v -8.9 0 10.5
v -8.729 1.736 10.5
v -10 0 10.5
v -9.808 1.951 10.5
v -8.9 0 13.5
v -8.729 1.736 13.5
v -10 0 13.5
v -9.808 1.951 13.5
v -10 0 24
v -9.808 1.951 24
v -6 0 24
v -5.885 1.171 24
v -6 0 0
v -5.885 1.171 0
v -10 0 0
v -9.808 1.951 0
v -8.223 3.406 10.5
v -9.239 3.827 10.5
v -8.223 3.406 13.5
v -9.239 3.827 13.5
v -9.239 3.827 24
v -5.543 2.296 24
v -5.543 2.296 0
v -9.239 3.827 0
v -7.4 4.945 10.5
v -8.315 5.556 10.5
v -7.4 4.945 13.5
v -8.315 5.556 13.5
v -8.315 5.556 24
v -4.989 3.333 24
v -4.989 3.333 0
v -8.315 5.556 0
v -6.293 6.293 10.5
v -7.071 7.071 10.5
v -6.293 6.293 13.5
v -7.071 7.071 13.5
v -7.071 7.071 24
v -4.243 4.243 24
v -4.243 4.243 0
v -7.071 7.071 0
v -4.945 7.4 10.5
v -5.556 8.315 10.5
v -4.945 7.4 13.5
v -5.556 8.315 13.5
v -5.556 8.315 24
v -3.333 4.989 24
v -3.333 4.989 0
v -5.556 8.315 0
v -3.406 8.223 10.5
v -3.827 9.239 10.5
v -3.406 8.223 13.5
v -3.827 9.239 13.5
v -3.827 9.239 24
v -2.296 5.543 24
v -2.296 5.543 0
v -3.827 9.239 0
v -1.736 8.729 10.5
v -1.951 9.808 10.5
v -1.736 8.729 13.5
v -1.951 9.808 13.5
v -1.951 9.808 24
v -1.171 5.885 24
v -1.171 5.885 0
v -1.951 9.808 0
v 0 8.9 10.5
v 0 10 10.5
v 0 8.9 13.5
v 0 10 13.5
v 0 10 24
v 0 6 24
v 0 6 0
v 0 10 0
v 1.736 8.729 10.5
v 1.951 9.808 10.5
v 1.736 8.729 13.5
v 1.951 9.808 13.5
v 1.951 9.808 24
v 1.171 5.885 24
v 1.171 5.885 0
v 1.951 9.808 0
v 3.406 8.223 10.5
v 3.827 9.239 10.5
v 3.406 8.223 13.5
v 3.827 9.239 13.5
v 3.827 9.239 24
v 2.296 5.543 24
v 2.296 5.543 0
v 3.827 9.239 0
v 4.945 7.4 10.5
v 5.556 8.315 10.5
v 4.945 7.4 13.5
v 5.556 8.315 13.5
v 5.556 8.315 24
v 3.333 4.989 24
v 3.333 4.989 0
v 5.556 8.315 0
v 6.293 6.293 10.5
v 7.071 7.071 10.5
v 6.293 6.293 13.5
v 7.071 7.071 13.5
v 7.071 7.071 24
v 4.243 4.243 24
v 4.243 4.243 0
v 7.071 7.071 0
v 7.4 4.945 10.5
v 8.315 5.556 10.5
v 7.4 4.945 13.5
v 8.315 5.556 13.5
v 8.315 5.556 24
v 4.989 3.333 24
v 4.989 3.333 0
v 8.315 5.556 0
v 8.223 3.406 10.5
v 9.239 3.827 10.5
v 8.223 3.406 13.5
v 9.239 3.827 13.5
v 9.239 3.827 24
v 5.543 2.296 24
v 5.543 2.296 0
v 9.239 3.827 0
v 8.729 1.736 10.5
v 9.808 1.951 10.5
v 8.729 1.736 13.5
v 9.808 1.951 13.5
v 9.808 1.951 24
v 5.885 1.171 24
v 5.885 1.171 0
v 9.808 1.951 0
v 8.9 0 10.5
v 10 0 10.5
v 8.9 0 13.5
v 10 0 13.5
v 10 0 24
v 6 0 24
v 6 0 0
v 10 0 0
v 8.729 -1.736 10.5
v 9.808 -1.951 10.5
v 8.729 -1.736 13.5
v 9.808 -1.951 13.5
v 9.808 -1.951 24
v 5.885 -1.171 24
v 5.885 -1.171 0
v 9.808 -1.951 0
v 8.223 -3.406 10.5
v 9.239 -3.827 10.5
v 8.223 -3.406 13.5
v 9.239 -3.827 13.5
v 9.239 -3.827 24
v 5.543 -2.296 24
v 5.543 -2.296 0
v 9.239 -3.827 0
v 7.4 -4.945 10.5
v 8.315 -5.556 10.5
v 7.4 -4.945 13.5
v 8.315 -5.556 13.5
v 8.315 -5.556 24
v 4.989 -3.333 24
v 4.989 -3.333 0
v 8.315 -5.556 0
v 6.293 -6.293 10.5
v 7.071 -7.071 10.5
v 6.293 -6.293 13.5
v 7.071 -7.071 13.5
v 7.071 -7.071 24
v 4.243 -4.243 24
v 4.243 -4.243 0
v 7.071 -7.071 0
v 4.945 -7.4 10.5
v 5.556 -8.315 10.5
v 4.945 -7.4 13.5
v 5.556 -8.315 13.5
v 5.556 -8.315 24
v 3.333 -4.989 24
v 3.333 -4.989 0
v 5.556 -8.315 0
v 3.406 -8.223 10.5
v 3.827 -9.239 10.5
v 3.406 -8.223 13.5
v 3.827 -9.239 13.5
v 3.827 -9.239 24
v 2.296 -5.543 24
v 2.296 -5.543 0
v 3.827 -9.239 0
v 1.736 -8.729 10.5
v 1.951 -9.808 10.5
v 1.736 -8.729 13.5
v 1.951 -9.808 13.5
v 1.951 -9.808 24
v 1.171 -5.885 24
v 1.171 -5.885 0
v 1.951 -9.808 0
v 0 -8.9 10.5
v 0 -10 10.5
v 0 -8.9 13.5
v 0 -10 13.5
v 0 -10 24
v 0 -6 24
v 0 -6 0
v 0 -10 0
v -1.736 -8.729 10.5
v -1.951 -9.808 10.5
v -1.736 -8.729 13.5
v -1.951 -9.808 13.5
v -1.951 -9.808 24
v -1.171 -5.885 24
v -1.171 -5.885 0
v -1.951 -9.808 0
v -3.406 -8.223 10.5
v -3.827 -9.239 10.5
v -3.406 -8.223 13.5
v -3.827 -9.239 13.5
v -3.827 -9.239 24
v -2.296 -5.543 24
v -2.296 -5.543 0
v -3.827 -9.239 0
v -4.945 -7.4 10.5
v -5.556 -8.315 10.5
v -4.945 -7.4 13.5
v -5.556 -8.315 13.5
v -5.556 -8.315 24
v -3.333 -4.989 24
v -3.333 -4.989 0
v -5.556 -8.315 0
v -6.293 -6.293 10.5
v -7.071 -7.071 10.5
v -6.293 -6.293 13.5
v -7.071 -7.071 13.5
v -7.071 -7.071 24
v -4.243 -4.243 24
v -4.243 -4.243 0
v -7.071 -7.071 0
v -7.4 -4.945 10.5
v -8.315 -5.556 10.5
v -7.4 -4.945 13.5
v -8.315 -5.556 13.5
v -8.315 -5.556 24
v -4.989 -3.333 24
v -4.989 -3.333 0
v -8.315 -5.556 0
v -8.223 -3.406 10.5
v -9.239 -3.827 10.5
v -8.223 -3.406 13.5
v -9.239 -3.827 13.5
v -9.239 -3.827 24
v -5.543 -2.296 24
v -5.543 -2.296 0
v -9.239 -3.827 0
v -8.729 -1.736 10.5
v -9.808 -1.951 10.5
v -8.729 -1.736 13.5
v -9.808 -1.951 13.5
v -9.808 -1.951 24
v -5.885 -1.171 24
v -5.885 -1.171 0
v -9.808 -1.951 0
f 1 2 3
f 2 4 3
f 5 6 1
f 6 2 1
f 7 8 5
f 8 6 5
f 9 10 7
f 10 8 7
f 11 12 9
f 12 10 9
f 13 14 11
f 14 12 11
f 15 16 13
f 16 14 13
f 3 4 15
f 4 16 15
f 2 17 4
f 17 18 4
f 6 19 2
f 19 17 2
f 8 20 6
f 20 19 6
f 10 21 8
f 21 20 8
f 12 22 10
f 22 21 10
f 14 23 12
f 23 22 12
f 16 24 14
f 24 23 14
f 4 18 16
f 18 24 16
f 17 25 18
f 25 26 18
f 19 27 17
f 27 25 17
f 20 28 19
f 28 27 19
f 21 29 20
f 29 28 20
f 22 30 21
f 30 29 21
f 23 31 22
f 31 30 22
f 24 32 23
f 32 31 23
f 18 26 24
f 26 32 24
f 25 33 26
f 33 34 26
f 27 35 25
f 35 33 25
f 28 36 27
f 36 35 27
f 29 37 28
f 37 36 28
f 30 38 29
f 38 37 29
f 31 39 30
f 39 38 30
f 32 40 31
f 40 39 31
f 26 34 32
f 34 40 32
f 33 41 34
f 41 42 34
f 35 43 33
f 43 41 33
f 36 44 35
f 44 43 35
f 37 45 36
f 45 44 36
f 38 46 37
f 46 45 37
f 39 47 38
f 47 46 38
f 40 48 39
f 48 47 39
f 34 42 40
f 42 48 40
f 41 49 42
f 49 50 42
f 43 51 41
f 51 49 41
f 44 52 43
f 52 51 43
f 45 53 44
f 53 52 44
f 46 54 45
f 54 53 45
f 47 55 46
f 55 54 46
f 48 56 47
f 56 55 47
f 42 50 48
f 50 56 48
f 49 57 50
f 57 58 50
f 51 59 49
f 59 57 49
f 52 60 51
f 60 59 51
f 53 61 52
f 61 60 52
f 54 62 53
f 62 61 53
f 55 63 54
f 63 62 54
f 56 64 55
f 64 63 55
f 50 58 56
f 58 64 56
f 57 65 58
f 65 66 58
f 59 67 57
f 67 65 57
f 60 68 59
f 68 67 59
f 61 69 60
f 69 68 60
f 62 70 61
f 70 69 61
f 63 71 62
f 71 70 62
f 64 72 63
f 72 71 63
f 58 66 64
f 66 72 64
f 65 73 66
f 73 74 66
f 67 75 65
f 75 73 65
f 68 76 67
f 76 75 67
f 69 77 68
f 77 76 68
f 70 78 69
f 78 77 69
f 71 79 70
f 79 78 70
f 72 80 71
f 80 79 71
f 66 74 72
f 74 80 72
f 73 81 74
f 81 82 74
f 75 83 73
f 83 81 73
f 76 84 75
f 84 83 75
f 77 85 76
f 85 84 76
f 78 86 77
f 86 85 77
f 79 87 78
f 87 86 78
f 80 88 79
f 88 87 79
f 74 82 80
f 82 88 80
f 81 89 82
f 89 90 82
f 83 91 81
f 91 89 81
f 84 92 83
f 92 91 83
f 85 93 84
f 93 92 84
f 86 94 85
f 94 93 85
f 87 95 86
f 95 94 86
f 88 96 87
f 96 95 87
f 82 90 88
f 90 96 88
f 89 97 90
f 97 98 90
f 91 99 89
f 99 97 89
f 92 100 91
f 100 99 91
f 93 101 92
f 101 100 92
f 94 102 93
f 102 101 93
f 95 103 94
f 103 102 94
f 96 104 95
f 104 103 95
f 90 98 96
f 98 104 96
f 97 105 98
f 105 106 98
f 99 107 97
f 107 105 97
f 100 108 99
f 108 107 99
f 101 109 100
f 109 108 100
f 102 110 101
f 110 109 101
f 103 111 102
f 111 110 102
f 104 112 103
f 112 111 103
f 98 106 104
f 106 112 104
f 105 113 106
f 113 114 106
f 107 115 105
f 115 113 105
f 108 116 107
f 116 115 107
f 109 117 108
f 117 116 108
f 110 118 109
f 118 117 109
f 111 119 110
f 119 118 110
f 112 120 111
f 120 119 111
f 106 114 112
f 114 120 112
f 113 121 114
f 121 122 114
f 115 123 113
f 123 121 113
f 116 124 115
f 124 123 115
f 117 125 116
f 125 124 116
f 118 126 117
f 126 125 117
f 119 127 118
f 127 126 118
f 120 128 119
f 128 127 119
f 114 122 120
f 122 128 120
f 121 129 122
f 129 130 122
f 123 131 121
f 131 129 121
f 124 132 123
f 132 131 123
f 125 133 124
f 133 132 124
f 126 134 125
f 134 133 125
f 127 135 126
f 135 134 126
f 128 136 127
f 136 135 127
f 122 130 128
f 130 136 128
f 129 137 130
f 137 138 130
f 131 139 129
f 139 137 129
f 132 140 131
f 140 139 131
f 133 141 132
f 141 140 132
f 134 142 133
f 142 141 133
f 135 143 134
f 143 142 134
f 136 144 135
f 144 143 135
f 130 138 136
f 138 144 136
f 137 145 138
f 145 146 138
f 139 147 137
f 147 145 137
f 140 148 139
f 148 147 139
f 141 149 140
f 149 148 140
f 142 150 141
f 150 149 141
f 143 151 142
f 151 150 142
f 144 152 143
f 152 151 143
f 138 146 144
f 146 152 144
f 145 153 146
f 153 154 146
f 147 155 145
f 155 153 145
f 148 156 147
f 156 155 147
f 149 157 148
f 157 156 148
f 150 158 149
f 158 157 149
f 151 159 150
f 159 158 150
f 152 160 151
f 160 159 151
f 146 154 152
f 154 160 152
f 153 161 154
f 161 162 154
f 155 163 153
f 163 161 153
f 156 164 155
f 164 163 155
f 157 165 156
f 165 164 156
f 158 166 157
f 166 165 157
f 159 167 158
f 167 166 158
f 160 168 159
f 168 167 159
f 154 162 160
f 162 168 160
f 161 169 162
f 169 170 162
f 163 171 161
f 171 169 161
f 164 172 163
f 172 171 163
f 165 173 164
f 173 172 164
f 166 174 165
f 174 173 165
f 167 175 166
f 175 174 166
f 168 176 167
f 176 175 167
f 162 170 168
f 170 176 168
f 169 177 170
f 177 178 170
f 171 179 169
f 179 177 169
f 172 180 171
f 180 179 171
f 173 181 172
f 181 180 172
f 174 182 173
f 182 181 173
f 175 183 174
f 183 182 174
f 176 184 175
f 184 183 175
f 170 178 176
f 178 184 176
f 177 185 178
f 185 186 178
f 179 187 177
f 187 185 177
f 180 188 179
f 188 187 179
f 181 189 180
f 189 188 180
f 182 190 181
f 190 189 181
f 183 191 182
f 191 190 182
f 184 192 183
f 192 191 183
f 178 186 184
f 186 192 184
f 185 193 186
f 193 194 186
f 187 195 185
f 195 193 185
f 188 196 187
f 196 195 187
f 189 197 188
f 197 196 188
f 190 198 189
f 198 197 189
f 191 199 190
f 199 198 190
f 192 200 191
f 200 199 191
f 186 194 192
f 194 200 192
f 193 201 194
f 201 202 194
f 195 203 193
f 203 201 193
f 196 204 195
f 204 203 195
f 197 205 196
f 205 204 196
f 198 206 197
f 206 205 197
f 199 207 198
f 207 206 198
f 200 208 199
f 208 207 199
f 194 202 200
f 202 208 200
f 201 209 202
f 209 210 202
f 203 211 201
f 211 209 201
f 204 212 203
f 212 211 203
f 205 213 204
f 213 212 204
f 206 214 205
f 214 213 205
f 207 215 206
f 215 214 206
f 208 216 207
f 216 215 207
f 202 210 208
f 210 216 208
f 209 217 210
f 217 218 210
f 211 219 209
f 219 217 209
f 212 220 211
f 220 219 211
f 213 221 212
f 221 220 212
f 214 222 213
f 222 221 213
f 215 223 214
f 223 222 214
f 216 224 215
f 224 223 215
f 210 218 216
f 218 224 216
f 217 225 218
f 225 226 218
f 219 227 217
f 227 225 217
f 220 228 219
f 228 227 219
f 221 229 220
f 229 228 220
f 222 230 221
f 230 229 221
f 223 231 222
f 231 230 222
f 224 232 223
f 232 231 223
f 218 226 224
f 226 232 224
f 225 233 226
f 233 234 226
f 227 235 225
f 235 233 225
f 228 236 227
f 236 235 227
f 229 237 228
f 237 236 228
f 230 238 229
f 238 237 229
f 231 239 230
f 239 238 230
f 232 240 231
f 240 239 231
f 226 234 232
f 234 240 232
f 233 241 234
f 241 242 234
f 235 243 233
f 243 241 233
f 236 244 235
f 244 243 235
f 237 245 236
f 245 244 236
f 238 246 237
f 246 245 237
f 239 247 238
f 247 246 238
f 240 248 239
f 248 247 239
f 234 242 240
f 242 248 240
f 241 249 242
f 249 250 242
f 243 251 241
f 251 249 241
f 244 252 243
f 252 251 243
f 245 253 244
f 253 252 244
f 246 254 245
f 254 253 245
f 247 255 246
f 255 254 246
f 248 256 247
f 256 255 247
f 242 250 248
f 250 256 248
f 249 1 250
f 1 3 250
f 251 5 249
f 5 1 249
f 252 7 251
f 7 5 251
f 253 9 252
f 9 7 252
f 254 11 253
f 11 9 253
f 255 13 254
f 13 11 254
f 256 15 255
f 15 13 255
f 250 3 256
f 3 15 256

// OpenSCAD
$fn = 32;

// ----------------------------------------------------------------------
// Grooved revolve: plain_grooves, bore R6
// ----------------------------------------------------------------------

// --- parameters (mm) ---
bore_r = 6;               // bore radius
outer_r = 10;             // outer radius of the body
total_h = 24;             // overall height, Z
wall = 4;                 // radial wall thickness
groove_w = 3;             // groove width
groove_d = 1.1;           // groove depth
grooves = 1;              // number of outer grooves

bbox_x = 2 * outer_r;  // full diameter
bore_d = 2 * bore_r;  // bore diameter
body_d = 2 * outer_r;  // body diameter
revolve_angle = 360;  // full turn around the Z axis

profile = [[6, 0], [10, 0], [10, 10.5], [8.9, 10.5], [8.9, 13.5], [10, 13.5], [10, 24], [6, 24]];  // primary outline, 8 points, counter clockwise

// --- the one profile operation ---
rotate_extrude(angle = revolve_angle) polygon(points = profile);
